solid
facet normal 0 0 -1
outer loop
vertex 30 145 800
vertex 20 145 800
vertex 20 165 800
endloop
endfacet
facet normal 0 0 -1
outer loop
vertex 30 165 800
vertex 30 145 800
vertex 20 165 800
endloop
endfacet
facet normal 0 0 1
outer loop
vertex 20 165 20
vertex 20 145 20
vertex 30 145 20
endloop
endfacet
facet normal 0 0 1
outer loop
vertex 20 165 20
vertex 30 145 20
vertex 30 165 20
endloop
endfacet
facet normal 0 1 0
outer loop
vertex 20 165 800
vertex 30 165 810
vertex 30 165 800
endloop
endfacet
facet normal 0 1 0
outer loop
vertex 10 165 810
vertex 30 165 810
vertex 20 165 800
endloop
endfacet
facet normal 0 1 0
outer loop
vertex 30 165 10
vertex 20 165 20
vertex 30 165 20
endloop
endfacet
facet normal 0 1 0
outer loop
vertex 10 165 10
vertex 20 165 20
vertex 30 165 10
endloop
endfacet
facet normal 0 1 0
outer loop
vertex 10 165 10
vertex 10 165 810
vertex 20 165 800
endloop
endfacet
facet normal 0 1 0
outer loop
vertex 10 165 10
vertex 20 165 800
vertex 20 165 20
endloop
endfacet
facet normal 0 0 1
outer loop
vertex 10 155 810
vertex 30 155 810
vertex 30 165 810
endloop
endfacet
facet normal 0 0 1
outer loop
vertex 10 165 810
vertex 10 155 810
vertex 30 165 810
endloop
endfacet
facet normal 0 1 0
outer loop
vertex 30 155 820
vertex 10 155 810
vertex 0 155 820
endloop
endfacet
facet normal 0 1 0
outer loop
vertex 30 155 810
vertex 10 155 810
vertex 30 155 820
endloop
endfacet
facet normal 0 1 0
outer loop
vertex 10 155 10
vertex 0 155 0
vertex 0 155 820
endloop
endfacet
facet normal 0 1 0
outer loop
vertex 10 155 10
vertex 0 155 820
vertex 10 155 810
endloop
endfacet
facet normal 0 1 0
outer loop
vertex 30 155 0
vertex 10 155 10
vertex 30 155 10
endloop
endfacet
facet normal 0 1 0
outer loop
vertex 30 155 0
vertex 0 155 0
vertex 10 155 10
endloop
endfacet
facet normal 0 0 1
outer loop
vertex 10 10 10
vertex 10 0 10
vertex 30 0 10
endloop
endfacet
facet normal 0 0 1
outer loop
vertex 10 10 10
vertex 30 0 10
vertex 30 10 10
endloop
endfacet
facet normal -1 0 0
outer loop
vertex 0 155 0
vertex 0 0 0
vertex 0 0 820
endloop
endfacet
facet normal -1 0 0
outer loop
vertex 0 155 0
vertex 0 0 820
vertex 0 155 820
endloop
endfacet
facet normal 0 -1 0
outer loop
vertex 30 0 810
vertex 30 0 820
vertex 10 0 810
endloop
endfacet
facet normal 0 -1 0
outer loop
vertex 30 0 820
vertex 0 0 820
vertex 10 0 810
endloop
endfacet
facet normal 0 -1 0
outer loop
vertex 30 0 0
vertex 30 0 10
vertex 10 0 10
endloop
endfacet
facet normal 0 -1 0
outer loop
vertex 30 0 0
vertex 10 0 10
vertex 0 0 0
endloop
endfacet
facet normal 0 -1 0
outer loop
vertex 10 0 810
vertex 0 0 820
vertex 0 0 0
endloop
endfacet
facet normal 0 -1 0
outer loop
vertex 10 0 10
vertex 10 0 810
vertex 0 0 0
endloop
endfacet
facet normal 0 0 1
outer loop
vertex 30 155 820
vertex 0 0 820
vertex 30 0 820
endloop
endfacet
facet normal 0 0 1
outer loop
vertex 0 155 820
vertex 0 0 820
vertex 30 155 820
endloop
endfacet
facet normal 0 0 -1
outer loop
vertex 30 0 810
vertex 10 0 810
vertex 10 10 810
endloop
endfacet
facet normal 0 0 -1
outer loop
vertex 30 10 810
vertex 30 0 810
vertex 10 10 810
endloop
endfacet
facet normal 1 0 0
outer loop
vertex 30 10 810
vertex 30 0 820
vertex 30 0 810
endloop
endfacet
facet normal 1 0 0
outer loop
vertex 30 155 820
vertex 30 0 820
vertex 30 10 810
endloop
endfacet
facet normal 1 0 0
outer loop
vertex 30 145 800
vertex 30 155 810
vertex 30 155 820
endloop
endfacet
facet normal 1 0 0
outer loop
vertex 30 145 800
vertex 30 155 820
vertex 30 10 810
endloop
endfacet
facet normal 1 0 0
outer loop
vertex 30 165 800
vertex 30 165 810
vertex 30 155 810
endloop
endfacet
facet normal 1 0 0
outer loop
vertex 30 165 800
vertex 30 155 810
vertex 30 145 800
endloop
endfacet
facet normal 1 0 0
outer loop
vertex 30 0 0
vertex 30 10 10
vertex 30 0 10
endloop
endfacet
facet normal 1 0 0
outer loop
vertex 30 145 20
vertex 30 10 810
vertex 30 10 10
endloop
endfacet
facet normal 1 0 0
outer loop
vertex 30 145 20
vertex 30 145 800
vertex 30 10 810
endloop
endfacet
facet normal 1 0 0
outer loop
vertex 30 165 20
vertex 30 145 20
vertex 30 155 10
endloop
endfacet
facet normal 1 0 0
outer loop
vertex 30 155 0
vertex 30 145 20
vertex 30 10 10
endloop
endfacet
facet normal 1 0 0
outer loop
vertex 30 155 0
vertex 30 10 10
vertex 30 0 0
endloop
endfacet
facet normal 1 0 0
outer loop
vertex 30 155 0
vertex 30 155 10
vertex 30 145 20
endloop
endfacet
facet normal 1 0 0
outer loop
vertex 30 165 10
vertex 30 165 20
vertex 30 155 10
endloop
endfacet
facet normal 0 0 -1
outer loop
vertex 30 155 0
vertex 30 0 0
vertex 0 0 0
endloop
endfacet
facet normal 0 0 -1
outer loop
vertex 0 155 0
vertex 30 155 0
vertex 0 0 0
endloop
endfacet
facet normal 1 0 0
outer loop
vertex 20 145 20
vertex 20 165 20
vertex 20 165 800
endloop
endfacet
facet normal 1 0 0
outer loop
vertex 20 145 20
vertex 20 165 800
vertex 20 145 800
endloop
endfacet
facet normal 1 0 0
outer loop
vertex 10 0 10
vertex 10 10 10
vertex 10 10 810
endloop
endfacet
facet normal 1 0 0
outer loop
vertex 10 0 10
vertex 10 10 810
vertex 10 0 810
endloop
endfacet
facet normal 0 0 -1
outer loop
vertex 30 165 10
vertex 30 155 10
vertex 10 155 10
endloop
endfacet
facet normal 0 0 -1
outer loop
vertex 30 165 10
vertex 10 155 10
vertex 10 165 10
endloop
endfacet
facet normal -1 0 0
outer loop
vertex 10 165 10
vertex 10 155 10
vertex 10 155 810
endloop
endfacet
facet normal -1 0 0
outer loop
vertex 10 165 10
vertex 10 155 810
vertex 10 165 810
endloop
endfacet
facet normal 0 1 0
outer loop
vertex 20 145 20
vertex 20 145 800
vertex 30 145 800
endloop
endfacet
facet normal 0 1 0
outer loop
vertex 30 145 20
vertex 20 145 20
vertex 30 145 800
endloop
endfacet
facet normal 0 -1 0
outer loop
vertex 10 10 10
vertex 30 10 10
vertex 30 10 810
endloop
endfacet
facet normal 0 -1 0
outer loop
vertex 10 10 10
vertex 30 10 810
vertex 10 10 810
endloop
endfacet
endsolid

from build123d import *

# Parameters (mm, degrees)
EXTRUDE_1_DEPTH     = 820
SKETCH_2_W          = 10
SKETCH_2_H          = 10
EXTRUDE_2_DEPTH     = 20
SKETCH_4_W          = 20
SKETCH_4_H          = 20
EXTRUDE_3_DEPTH     = 10
SKETCH_5_W          = 10
SKETCH_5_H          = 10
CUT_EXTRUDE_2_DEPTH = 837.973715238


with BuildPart() as part:
    # Эскиз1 → Бобышка-Вытянуть1 (new body)
    with BuildSketch(Plane.XY):
        Polygon((0, 0), (0, 155), (10, 155), (10, 165), (20, 165), (20, 145), (30, 145), (30, 10), (10, 10), (10, 0), align=None)
    extrude(amount=EXTRUDE_1_DEPTH)

    # Эскиз2 → Бобышка-Вытянуть2 (add)
    with BuildSketch(Plane(origin=(10, 0, 0), x_dir=(0, 0, -1), z_dir=(1, 0, 0))):
        with Locations((-815, 5)):
            Rectangle(SKETCH_2_W, SKETCH_2_H)
        with Locations((-5, 5)):
            Rectangle(SKETCH_2_W, SKETCH_2_H)
    extrude(amount=EXTRUDE_2_DEPTH)

    # Эскиз4 → Бобышка-Вытянуть3 (add)
    with BuildSketch(Plane(origin=(20, 0, 0), x_dir=(0, 0, -1), z_dir=(1, 0, 0))):
        with Locations((-810, 155)):
            Rectangle(SKETCH_4_W, SKETCH_4_H)
        with Locations((-10, 155)):
            Rectangle(SKETCH_4_W, SKETCH_4_H)
    extrude(amount=EXTRUDE_3_DEPTH)

    # Эскиз5 → Вырез-Вытянуть2 (cut, through all)
    with BuildSketch(Plane(origin=(30, 0, 0), x_dir=(0, 0, -1), z_dir=(1, 0, 0))):
        with Locations((-815, 160)):
            Rectangle(SKETCH_5_W, SKETCH_5_H)
        with Locations((-5, 160)):
            Rectangle(SKETCH_5_W, SKETCH_5_H)
    extrude(amount=-CUT_EXTRUDE_2_DEPTH, mode=Mode.SUBTRACT)


solid = part.part
